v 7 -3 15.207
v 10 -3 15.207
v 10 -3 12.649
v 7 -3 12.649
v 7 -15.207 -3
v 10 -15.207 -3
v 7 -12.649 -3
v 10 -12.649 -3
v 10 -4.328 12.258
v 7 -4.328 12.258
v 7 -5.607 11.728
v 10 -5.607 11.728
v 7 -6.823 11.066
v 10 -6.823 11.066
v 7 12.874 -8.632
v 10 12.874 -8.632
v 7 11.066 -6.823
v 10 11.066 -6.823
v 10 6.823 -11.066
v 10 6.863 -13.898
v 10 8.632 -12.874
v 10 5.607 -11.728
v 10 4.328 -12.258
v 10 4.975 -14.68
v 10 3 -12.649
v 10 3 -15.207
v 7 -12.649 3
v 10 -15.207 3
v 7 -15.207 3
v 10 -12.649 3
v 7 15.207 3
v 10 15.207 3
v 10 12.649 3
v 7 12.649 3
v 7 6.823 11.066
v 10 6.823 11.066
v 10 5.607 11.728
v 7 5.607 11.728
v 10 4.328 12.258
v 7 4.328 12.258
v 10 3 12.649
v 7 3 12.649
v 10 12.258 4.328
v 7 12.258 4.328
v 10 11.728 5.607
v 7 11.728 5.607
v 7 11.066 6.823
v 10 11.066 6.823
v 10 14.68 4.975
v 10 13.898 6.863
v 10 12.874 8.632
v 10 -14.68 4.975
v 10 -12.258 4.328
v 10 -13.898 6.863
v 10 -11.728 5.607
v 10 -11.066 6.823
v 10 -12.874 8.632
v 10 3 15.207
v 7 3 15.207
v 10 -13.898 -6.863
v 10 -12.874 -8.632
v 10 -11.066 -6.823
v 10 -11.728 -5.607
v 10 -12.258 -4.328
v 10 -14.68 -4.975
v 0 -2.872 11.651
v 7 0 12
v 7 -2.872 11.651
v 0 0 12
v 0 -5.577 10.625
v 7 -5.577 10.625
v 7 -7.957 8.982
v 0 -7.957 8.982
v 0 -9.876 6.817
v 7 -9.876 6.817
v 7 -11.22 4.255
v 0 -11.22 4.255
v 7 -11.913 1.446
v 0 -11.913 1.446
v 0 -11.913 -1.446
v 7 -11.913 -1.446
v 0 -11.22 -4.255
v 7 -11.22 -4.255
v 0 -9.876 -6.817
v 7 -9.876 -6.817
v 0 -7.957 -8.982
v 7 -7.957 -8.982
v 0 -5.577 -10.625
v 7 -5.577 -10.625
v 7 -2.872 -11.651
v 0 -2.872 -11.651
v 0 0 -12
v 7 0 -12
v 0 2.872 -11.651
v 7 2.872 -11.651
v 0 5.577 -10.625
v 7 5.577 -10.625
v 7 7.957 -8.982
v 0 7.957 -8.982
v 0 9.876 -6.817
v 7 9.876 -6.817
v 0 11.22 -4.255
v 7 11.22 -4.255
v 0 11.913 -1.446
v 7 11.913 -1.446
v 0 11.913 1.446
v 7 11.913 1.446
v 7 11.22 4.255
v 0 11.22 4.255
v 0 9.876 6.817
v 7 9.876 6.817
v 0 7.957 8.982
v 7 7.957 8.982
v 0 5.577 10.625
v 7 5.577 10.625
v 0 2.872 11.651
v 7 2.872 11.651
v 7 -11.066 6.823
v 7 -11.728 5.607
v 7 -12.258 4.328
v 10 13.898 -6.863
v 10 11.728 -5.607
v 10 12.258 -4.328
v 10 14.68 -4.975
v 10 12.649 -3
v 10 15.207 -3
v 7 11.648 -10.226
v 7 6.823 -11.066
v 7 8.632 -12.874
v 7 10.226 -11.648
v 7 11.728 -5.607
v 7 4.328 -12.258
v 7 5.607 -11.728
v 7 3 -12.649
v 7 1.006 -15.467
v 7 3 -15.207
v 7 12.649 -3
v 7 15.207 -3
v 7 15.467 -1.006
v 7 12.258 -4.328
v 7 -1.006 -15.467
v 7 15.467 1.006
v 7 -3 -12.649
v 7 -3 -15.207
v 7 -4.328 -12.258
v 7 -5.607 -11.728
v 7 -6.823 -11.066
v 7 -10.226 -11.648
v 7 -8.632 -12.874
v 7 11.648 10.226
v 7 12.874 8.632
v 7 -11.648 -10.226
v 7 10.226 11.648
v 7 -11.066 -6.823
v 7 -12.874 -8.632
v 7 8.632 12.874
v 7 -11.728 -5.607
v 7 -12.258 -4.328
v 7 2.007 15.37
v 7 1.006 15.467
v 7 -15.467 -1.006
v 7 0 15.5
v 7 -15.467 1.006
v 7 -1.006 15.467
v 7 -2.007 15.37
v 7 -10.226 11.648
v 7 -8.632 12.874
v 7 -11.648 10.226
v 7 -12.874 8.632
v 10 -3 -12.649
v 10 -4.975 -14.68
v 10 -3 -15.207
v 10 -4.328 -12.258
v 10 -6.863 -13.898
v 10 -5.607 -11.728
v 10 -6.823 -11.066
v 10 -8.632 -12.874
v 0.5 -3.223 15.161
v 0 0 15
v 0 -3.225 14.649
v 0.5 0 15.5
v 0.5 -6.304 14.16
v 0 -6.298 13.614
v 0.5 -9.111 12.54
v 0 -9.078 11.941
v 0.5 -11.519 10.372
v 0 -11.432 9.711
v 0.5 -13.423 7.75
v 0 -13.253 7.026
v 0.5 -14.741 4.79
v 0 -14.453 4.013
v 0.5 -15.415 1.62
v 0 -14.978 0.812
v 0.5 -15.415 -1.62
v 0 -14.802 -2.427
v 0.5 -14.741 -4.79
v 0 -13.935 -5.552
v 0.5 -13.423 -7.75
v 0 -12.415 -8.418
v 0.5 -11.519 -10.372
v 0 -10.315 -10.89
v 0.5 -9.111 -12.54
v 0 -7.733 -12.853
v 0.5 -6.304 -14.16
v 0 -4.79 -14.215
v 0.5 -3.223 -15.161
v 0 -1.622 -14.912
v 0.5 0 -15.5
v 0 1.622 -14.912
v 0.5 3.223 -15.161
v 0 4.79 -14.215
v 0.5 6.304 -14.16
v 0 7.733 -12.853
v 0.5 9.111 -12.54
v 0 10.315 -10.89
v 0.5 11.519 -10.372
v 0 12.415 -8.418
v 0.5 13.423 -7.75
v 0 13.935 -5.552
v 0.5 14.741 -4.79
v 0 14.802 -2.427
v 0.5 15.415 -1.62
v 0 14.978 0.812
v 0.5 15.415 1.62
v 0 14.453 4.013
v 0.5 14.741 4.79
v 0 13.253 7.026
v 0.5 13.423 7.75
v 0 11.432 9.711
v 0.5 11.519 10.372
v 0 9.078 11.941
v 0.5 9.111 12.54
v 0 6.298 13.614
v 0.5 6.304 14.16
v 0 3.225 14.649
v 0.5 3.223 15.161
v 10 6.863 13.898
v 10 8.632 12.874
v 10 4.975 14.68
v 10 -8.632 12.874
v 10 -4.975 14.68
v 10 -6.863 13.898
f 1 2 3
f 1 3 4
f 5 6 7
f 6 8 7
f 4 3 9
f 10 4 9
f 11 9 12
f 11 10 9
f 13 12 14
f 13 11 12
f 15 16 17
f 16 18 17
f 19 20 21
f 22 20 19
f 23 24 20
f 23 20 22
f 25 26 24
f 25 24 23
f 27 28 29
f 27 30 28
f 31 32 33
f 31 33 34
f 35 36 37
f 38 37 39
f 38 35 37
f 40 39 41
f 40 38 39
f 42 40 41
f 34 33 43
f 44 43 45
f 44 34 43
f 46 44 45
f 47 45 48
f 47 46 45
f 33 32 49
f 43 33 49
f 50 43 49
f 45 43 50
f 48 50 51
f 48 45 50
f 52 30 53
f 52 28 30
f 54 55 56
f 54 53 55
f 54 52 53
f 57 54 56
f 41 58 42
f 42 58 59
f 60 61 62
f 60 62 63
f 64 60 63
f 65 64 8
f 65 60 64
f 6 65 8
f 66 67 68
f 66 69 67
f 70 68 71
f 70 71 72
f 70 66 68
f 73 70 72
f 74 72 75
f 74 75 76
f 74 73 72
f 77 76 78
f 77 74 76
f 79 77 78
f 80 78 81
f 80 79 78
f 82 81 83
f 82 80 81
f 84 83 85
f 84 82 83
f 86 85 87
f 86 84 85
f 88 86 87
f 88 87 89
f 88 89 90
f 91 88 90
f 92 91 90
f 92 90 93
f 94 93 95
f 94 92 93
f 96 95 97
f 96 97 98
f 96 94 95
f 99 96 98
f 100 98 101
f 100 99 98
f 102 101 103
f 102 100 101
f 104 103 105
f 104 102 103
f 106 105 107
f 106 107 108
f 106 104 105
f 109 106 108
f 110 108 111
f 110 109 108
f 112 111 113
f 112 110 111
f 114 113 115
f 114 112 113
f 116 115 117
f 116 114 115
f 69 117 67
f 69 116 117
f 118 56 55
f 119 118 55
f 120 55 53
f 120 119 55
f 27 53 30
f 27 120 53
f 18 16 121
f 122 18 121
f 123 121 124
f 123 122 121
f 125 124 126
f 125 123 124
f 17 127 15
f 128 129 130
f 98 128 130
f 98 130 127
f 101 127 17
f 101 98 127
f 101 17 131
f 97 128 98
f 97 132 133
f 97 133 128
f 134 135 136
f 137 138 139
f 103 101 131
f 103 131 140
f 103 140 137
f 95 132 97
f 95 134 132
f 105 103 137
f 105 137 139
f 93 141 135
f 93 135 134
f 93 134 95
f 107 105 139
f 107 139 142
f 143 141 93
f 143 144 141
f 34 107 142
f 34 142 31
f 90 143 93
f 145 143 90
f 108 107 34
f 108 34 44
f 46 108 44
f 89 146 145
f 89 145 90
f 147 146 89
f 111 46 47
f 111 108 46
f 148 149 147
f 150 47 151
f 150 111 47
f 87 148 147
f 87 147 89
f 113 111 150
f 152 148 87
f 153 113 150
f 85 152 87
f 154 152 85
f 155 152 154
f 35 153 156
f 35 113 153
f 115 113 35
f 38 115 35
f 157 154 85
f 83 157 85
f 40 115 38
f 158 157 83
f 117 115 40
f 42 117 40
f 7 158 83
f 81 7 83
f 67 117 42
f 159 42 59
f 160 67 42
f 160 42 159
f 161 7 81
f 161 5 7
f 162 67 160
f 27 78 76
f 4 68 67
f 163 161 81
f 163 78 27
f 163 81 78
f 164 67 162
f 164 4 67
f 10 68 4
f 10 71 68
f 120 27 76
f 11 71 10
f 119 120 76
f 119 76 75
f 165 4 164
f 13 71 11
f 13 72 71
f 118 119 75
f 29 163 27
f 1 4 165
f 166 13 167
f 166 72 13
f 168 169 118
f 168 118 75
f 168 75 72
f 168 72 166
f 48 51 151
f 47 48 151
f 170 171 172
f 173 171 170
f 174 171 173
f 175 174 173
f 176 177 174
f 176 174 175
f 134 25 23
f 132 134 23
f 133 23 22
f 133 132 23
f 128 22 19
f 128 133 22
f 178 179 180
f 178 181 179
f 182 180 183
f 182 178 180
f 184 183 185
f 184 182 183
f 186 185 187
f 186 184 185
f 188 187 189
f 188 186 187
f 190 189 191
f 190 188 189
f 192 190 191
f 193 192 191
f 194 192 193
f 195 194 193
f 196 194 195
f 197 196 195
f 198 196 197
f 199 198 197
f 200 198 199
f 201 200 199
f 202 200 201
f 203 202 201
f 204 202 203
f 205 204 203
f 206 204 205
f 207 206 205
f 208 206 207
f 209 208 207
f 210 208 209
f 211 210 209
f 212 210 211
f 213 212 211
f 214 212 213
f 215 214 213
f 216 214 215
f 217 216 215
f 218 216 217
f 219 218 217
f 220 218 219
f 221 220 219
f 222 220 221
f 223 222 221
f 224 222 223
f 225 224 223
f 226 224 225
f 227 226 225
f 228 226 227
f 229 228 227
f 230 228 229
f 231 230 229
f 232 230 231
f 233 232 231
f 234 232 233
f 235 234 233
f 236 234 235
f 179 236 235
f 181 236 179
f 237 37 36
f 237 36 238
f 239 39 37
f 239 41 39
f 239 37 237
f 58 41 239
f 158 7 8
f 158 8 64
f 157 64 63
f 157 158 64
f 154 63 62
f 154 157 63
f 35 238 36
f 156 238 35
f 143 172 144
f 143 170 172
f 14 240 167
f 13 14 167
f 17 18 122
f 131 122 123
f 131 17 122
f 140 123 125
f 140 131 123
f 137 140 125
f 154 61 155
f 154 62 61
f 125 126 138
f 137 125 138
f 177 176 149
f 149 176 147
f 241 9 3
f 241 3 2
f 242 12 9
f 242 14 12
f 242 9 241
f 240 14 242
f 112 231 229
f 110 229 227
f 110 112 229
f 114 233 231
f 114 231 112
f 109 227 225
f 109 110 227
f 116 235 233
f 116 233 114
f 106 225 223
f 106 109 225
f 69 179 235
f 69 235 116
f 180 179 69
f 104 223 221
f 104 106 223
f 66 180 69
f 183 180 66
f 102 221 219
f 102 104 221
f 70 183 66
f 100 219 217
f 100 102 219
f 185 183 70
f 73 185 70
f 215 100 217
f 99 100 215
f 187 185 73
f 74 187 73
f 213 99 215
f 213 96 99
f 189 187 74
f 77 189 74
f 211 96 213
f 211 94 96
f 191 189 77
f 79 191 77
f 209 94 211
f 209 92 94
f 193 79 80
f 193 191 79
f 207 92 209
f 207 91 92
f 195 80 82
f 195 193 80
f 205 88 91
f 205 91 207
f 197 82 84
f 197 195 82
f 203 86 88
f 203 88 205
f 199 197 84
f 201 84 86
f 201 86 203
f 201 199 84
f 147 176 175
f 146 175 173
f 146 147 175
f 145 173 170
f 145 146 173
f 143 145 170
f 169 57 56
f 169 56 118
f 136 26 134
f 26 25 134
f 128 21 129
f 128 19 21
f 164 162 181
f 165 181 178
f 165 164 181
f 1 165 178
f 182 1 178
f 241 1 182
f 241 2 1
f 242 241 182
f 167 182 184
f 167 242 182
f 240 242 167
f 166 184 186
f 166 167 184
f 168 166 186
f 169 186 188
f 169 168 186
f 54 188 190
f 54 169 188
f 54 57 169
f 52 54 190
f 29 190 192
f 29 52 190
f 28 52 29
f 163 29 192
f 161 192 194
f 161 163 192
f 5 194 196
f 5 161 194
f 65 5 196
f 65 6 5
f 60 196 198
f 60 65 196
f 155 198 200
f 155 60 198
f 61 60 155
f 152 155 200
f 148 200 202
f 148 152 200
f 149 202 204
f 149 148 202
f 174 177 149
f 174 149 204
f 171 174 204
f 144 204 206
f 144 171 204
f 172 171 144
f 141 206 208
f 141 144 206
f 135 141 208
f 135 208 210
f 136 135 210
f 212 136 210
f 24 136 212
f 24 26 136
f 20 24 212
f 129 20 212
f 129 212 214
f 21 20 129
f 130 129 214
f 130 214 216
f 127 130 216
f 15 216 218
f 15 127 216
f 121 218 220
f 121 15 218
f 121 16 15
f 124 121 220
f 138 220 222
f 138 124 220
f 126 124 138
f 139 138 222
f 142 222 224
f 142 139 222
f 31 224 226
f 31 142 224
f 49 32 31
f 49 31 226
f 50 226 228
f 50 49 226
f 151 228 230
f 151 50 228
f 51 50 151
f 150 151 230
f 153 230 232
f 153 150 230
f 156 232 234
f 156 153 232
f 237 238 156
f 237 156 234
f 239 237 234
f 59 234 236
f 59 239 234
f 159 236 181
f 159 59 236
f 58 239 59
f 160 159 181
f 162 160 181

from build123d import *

# Parameters (mm, degrees)
ESQUISSE2_W                  = 4
ESQUISSE2_H                  = 6
ENL_V_MAT_EXTRU_1_DEPTH      = 37.503424497
R_P_TITION_CIRCULAIRE1_COUNT = 4
R_P_TITION_CIRCULAIRE1_ANGLE = 135


with BuildPart() as part:
    # Esquisse1 → Base-Révolution (revolve)
    with BuildSketch(Plane.XY, mode=Mode.PRIVATE) as base_r_volution_sk:
        Polygon((0, 12), (0, 15), (0.5, 15.5), (10, 15.5), (10, 13), (7, 13), (7, 12), align=None)
    revolve(base_r_volution_sk.sketch.rotate(Axis((-2, 0, 0), (1, 0, 0)), 90), axis=Axis((-2, 0, 0), (1, 0, 0)))

    # Esquisse2 → Enlèv. mat.-Extru.1 (cut, through all)
    with BuildSketch(Plane(origin=(0, 16, 0), x_dir=(-1, 0, 0), z_dir=(0, 1, 0))):
        with Locations((-9, 0)):
            Rectangle(ESQUISSE2_W, ESQUISSE2_H)
    enl_v_mat_extru_1 = extrude(amount=-ENL_V_MAT_EXTRU_1_DEPTH, mode=Mode.SUBTRACT)

    # Répétition circulaire1: Enlèv. mat.-Extru.1 ×4 about axis
    r_p_tition_circulaire1_axis = Axis((-2, 0, 0), (1, 0, 0))
    for i in range(1, R_P_TITION_CIRCULAIRE1_COUNT):
        add(enl_v_mat_extru_1.rotate(r_p_tition_circulaire1_axis, i * R_P_TITION_CIRCULAIRE1_ANGLE / (R_P_TITION_CIRCULAIRE1_COUNT - 1)), mode=Mode.SUBTRACT)


solid = part.part
